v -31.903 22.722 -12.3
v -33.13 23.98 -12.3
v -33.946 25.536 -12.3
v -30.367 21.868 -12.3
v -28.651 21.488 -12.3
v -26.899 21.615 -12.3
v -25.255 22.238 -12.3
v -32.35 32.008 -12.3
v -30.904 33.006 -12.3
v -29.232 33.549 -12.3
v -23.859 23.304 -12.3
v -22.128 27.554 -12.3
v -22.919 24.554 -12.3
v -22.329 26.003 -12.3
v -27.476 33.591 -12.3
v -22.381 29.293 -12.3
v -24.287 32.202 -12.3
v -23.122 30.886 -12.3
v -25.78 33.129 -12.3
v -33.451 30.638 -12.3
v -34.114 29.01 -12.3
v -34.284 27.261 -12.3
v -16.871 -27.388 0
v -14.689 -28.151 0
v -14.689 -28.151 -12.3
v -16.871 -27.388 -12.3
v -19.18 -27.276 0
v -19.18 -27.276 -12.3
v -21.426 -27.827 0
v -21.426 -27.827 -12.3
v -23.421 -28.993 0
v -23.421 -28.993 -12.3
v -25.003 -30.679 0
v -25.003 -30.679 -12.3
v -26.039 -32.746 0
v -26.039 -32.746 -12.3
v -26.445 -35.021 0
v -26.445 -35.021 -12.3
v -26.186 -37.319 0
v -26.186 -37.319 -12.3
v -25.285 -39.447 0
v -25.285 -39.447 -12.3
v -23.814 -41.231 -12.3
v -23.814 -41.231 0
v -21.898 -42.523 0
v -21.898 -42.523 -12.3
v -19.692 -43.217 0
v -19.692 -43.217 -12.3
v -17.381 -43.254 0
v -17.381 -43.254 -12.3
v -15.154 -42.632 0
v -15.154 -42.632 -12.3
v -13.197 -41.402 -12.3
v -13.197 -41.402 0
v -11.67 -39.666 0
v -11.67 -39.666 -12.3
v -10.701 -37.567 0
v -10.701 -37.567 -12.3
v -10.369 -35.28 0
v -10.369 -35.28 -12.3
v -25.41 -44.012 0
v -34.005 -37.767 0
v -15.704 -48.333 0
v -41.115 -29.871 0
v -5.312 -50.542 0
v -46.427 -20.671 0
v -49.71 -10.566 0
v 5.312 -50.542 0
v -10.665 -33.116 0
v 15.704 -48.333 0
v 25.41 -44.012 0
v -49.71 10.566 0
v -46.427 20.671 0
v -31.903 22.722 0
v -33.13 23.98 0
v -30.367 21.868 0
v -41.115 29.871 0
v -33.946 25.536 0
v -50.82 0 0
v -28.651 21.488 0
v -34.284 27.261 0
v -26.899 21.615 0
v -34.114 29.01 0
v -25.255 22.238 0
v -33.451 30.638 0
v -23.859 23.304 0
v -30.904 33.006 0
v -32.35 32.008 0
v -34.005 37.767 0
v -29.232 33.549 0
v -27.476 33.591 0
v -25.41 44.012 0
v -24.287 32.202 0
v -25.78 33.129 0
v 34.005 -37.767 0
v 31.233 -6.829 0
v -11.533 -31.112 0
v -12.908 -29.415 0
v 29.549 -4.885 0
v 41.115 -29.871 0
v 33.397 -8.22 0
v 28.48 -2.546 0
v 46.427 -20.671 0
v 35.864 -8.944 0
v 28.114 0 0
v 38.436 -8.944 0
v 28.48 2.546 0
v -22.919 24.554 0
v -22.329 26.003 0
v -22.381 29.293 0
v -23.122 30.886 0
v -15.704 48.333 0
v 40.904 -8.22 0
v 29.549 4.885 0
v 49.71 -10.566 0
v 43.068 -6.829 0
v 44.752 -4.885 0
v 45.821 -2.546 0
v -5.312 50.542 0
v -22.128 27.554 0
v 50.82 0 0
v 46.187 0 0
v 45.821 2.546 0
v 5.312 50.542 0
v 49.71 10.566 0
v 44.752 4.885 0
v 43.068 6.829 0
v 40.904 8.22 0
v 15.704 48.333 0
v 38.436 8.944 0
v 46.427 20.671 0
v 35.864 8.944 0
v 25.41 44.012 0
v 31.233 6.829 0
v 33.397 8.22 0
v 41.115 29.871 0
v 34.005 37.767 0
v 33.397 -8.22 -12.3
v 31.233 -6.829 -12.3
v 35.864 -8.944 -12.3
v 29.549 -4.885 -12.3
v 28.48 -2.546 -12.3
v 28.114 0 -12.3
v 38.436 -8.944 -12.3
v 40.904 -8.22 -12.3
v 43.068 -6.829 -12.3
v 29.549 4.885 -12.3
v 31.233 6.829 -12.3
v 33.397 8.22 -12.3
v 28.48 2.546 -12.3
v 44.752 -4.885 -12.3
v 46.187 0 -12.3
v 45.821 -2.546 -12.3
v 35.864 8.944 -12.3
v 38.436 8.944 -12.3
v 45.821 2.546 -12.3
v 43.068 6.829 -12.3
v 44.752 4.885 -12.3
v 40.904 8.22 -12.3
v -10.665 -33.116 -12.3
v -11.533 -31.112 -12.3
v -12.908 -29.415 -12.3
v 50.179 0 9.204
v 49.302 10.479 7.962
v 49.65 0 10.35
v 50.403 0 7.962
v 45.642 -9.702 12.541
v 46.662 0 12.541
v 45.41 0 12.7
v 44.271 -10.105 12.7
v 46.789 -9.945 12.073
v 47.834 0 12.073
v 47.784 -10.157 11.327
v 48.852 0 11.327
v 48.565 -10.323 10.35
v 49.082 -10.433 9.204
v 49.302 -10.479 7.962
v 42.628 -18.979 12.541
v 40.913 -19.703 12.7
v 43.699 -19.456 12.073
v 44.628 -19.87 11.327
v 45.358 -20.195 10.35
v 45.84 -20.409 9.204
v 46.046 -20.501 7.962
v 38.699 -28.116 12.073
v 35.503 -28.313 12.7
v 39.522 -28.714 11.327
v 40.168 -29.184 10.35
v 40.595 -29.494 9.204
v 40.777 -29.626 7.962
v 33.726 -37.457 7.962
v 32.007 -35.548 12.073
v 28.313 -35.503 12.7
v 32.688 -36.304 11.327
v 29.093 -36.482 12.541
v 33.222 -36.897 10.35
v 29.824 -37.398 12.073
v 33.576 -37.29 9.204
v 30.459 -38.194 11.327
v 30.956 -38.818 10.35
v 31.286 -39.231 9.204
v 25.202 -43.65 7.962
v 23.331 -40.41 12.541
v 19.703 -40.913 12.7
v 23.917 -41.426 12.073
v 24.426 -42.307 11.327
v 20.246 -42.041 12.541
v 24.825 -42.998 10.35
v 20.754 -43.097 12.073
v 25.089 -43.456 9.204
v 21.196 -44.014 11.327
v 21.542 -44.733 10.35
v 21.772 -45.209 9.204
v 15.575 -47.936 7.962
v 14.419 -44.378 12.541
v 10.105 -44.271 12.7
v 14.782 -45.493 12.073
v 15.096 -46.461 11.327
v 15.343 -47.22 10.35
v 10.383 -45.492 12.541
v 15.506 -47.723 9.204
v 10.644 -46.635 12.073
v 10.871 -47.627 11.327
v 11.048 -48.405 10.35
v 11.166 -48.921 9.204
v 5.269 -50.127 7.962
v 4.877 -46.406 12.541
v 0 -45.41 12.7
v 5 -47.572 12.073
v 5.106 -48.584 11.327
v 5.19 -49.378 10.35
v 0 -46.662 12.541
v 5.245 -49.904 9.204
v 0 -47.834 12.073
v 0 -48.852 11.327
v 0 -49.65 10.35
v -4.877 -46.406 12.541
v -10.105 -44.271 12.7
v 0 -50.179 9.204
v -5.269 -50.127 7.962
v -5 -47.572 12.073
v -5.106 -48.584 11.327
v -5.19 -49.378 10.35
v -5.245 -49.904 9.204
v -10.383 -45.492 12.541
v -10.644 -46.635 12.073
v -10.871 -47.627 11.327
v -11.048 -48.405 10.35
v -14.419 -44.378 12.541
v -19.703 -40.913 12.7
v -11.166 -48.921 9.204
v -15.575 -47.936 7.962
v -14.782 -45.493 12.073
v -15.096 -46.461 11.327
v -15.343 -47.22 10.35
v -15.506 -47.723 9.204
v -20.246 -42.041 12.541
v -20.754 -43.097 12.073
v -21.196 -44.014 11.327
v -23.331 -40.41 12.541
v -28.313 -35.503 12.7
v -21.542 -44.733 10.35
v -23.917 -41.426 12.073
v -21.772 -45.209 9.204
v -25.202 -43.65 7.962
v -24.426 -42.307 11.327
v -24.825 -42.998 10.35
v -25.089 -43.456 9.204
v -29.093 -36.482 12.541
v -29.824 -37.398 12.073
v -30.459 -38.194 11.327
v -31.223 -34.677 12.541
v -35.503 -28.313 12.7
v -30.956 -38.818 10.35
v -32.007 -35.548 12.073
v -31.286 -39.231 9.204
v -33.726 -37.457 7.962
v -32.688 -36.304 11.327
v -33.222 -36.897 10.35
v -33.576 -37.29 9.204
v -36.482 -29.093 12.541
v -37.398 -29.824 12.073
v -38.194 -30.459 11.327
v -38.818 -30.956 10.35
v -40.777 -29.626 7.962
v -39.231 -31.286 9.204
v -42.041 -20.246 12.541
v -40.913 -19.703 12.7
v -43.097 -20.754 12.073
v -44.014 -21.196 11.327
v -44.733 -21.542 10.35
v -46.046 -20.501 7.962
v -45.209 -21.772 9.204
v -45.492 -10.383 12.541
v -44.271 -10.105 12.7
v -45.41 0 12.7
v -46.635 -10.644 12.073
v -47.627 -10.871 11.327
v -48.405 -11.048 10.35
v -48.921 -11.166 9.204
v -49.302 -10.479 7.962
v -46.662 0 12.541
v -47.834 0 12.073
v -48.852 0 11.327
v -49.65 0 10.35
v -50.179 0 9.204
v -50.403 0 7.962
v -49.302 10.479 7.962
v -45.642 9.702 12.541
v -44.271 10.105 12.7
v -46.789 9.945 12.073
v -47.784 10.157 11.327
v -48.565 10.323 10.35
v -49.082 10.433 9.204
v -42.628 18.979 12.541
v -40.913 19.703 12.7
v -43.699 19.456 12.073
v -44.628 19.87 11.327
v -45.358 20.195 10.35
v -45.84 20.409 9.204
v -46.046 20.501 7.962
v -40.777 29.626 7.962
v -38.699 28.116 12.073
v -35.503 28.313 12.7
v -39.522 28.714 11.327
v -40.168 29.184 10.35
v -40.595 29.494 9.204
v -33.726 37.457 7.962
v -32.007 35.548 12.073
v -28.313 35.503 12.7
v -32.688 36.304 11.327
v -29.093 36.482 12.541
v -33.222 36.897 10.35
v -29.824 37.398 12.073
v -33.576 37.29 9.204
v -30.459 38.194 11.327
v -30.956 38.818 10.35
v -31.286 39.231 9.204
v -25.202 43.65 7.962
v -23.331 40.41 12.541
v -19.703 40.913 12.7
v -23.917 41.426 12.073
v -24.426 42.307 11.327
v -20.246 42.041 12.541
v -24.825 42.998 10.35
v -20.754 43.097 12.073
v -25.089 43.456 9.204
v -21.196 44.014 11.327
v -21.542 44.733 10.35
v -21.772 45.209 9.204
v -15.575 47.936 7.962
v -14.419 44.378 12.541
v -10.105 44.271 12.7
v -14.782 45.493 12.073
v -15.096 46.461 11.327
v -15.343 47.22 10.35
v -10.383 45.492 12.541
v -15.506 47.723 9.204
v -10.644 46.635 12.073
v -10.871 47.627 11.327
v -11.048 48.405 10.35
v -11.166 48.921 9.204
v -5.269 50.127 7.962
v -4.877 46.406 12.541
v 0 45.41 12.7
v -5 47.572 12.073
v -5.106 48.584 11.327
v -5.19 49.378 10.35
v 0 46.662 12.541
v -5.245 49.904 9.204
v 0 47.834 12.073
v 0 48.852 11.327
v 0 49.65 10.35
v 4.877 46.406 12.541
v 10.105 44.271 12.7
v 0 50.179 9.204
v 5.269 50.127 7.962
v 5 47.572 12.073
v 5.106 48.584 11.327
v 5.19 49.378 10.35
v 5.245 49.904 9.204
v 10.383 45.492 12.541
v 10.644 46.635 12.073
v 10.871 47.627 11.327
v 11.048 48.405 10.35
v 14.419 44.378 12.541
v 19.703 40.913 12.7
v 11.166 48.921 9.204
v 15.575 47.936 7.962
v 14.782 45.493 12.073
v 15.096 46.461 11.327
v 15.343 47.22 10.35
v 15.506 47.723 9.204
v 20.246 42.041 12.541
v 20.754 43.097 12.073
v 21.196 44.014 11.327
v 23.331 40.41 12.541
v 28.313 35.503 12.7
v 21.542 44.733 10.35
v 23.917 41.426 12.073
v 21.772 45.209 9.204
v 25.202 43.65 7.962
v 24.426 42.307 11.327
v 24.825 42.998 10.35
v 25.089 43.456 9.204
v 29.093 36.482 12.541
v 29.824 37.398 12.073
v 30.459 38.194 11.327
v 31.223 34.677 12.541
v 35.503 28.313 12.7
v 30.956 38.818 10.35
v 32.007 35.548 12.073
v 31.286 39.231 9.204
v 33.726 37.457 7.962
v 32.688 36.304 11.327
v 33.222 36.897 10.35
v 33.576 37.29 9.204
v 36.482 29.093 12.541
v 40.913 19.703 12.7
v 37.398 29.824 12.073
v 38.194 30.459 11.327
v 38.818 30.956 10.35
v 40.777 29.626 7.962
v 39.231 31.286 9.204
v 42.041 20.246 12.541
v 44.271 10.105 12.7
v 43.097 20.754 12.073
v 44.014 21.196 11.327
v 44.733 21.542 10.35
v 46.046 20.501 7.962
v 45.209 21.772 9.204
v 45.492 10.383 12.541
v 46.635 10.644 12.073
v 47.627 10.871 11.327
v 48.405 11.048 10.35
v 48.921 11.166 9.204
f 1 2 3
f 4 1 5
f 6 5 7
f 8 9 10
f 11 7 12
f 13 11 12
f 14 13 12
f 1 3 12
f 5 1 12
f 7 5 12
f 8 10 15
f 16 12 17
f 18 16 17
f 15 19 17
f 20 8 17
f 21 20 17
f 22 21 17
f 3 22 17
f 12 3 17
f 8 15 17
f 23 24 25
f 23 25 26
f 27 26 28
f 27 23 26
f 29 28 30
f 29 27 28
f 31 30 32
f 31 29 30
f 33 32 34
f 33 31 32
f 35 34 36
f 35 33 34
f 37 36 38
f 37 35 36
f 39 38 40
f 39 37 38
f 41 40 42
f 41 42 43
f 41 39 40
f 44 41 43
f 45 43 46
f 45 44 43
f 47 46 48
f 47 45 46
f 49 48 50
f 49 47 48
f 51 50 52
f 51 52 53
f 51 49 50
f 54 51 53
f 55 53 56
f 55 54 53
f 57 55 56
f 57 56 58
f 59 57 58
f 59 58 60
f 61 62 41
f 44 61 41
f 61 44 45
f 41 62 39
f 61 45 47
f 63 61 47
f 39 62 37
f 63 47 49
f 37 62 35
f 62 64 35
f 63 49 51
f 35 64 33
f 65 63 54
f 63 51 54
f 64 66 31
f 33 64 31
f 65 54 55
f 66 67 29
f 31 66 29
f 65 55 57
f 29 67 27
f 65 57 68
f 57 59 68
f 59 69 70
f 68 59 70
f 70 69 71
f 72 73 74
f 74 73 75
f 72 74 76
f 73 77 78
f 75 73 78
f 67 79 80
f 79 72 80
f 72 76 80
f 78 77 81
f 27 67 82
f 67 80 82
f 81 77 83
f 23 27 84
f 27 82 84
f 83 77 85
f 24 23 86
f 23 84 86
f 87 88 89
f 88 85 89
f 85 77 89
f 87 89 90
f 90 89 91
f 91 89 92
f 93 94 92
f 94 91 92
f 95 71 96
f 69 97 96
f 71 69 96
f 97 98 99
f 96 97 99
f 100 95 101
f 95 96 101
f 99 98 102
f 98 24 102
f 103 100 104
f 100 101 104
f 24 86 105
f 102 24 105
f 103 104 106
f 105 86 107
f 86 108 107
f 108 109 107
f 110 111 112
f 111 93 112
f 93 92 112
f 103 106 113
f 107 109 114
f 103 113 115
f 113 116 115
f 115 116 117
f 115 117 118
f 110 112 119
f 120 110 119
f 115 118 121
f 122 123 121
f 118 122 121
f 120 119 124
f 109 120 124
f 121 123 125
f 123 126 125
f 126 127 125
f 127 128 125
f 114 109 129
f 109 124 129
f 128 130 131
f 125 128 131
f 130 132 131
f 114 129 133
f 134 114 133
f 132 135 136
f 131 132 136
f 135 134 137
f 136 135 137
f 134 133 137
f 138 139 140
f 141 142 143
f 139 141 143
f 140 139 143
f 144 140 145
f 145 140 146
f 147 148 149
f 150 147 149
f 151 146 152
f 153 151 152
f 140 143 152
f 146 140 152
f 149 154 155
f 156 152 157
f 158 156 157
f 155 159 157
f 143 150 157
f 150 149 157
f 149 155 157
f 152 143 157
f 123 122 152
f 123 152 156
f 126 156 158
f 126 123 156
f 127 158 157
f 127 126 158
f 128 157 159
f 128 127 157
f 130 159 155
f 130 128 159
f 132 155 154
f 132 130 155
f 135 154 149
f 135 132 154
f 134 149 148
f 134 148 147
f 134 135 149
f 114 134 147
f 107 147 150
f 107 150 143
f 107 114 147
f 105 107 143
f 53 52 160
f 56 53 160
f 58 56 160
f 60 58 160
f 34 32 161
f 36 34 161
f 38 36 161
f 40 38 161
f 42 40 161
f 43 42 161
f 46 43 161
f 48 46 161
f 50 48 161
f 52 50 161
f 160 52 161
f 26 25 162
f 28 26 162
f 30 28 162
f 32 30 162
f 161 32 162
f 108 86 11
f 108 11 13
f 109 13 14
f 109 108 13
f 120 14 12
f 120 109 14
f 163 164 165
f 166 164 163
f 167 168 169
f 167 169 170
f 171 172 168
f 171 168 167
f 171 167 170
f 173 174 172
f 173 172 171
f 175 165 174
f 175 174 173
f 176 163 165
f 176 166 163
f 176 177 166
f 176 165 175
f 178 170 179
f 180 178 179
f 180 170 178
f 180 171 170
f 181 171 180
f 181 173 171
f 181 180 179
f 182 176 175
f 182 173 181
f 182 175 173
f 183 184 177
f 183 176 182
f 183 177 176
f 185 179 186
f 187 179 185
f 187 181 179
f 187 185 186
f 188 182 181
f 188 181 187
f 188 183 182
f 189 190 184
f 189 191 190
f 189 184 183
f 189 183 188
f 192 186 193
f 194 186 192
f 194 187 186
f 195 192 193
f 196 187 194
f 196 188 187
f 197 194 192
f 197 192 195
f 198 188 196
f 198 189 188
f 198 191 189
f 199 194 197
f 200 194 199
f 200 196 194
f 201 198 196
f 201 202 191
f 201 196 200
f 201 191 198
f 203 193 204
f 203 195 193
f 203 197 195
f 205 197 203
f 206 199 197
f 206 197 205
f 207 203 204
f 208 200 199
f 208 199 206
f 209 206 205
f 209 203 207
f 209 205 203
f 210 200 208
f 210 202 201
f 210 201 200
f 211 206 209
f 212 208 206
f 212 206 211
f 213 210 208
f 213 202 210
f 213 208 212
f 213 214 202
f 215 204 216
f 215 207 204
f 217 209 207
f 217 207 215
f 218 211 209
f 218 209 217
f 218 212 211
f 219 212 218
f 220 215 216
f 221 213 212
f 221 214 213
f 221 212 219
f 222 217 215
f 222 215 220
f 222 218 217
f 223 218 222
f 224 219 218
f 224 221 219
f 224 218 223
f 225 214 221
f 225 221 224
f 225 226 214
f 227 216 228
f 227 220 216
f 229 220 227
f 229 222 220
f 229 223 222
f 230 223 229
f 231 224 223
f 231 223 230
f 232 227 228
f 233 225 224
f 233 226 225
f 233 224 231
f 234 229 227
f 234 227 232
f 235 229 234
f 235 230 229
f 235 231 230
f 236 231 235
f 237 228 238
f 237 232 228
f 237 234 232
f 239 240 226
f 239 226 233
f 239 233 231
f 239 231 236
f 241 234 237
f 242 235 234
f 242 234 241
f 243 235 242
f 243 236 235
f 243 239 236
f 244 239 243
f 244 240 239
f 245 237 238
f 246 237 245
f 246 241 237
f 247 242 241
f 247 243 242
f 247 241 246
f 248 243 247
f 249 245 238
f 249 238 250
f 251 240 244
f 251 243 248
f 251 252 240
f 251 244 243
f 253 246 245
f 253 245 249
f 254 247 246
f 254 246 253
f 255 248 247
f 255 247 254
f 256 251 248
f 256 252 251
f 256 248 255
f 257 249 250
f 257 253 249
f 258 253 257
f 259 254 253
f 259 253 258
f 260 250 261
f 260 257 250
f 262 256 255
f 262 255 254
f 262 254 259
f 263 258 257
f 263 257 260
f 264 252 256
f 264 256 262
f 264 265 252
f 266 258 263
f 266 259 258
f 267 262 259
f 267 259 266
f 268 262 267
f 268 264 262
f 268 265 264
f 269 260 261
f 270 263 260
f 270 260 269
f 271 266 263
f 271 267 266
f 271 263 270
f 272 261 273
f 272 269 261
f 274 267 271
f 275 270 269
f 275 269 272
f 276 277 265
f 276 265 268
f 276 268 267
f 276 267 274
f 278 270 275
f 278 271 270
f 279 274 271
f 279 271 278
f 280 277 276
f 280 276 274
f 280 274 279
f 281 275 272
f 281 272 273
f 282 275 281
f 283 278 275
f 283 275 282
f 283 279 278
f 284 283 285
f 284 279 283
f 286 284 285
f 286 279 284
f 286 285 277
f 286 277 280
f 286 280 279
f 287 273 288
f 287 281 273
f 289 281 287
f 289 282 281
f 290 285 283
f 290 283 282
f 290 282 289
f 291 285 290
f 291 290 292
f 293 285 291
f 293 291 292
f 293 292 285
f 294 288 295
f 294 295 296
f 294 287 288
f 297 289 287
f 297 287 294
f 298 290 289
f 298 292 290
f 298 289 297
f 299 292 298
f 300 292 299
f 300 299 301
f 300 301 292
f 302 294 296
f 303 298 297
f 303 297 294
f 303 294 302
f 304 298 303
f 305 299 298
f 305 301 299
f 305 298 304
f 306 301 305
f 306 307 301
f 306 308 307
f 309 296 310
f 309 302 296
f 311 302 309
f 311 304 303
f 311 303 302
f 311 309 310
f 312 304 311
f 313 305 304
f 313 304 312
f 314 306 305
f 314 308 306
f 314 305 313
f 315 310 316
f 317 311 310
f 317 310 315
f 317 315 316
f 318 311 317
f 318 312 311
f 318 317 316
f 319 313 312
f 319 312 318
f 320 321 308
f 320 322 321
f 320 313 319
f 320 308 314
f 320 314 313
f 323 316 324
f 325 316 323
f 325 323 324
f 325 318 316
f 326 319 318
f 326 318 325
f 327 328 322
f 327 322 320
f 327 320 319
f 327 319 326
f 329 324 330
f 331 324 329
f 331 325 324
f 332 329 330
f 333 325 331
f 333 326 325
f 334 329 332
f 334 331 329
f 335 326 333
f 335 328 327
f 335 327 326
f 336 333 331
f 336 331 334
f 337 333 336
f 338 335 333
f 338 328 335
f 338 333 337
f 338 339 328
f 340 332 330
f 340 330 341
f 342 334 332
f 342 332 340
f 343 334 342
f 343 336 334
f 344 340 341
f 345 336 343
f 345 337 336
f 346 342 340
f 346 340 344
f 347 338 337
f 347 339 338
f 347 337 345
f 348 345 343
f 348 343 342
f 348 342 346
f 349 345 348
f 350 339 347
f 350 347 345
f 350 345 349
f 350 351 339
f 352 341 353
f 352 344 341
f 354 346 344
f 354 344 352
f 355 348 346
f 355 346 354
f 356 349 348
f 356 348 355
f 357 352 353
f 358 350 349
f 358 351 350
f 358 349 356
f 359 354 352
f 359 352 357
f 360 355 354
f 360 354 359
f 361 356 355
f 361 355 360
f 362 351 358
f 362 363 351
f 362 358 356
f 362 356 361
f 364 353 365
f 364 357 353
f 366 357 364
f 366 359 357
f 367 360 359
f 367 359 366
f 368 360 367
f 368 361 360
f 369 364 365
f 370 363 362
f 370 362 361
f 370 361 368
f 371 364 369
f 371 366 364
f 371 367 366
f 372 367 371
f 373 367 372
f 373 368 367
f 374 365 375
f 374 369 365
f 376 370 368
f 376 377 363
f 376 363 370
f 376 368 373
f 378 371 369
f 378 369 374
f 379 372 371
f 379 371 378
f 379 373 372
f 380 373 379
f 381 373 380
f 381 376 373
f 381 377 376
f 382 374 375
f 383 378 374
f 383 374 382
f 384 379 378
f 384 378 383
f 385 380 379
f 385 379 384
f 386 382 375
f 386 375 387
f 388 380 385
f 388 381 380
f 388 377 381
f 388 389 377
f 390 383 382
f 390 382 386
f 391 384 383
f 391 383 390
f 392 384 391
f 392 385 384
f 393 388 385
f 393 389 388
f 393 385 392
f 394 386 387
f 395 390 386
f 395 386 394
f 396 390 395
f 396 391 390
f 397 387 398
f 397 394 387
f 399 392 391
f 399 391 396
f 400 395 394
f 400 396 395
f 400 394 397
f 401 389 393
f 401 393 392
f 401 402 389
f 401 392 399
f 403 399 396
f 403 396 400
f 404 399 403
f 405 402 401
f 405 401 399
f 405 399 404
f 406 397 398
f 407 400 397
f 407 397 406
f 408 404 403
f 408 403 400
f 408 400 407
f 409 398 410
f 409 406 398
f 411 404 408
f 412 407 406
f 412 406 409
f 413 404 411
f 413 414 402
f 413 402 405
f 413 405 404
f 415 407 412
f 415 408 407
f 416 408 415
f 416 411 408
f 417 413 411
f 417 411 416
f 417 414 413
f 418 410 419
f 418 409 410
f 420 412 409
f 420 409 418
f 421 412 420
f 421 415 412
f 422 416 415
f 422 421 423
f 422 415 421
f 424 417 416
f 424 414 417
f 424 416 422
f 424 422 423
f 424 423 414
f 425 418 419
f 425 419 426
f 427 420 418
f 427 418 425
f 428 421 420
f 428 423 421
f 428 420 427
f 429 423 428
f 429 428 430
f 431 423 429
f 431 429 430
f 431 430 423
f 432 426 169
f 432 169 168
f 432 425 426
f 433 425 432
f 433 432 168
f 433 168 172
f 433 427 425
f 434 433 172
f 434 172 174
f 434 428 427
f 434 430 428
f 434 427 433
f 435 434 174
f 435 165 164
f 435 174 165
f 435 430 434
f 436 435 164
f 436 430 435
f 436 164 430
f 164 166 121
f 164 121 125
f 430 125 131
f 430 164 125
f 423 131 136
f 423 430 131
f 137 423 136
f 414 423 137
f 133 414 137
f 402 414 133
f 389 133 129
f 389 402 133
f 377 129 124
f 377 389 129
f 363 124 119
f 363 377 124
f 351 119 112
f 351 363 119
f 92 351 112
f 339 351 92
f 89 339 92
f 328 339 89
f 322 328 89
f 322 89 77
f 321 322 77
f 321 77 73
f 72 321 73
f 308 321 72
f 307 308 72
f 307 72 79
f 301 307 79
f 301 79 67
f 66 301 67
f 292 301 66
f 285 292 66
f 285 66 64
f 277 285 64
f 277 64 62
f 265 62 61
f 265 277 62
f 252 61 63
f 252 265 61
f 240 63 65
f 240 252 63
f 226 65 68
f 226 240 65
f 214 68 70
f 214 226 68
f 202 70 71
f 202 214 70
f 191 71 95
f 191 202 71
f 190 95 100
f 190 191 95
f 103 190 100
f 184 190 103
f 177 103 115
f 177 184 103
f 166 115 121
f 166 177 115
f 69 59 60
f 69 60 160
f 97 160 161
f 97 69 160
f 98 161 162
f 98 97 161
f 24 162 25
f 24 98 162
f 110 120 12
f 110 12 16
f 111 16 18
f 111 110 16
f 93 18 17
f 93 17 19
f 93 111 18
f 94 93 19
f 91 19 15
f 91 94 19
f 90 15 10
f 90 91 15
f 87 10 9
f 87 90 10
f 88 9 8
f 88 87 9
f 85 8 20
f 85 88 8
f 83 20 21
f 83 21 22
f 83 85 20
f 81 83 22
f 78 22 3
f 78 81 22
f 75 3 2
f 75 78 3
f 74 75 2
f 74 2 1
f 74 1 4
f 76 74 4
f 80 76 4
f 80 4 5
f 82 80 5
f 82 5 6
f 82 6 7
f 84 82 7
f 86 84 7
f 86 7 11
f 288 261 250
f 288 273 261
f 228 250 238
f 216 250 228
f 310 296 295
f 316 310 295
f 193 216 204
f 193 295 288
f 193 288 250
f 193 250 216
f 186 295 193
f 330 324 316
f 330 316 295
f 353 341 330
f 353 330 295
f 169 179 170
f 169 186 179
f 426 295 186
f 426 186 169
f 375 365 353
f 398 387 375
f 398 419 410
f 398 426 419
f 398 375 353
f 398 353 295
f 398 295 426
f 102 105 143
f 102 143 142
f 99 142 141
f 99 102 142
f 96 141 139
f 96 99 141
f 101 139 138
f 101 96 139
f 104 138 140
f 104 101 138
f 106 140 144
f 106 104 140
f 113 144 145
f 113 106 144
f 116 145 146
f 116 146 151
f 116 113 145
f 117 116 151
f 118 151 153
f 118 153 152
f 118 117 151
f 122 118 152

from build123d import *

# Parameters (mm, degrees)
F0_R     = 50.8204008134
F1_DEPTH = 12.7
F1_TAPER = 3
F3_DEPTH = 25
F4_R     = 5


with BuildPart() as f1:
    # F0 (on Top) → F1 (new body)
    with BuildSketch(Plane.XY):
        Circle(F0_R)
    extrude(amount=F1_DEPTH, taper=F1_TAPER)

    # F2 (on face) → F3 (join)
    with BuildSketch(Plane.XY.offset(12.7)):
        with BuildLine():
            ThreePointArc((-10.3685208828, -35.279545933), (-11.5330508003, -31.1117961239), (-14.6893061002, -28.1513365513))
            ThreePointArc((-14.6893061002, -28.1513365513), (-25.2845296612, -39.4472957421), (-10.3685208828, -35.279545933))
        make_face()
        with BuildLine():
            ThreePointArc((46.1865502421, 0), (37.1504314244, 9.0361188178), (28.1143126066, 0))
            ThreePointArc((28.1143126066, 0), (37.1504314244, -9.0361188178), (46.1865502421, 0))
        make_face()
        with BuildLine():
            ThreePointArc((-22.1275595237, 27.55375579), (-33.8414364746, 29.8480310368), (-23.8585792296, 23.3042421225))
            ThreePointArc((-23.8585792296, 23.3042421225), (-22.5769153544, 25.2594805432), (-22.1275595237, 27.55375579))
        make_face()
    extrude(amount=-F3_DEPTH)

    # F4
    f4_edges = [f1.edges().sort_by_distance(p)[0] for p in [
        (-50.154822, 0, 12.7),
    ]]
    fillet(f4_edges, radius=F4_R)


solid = f1.part
